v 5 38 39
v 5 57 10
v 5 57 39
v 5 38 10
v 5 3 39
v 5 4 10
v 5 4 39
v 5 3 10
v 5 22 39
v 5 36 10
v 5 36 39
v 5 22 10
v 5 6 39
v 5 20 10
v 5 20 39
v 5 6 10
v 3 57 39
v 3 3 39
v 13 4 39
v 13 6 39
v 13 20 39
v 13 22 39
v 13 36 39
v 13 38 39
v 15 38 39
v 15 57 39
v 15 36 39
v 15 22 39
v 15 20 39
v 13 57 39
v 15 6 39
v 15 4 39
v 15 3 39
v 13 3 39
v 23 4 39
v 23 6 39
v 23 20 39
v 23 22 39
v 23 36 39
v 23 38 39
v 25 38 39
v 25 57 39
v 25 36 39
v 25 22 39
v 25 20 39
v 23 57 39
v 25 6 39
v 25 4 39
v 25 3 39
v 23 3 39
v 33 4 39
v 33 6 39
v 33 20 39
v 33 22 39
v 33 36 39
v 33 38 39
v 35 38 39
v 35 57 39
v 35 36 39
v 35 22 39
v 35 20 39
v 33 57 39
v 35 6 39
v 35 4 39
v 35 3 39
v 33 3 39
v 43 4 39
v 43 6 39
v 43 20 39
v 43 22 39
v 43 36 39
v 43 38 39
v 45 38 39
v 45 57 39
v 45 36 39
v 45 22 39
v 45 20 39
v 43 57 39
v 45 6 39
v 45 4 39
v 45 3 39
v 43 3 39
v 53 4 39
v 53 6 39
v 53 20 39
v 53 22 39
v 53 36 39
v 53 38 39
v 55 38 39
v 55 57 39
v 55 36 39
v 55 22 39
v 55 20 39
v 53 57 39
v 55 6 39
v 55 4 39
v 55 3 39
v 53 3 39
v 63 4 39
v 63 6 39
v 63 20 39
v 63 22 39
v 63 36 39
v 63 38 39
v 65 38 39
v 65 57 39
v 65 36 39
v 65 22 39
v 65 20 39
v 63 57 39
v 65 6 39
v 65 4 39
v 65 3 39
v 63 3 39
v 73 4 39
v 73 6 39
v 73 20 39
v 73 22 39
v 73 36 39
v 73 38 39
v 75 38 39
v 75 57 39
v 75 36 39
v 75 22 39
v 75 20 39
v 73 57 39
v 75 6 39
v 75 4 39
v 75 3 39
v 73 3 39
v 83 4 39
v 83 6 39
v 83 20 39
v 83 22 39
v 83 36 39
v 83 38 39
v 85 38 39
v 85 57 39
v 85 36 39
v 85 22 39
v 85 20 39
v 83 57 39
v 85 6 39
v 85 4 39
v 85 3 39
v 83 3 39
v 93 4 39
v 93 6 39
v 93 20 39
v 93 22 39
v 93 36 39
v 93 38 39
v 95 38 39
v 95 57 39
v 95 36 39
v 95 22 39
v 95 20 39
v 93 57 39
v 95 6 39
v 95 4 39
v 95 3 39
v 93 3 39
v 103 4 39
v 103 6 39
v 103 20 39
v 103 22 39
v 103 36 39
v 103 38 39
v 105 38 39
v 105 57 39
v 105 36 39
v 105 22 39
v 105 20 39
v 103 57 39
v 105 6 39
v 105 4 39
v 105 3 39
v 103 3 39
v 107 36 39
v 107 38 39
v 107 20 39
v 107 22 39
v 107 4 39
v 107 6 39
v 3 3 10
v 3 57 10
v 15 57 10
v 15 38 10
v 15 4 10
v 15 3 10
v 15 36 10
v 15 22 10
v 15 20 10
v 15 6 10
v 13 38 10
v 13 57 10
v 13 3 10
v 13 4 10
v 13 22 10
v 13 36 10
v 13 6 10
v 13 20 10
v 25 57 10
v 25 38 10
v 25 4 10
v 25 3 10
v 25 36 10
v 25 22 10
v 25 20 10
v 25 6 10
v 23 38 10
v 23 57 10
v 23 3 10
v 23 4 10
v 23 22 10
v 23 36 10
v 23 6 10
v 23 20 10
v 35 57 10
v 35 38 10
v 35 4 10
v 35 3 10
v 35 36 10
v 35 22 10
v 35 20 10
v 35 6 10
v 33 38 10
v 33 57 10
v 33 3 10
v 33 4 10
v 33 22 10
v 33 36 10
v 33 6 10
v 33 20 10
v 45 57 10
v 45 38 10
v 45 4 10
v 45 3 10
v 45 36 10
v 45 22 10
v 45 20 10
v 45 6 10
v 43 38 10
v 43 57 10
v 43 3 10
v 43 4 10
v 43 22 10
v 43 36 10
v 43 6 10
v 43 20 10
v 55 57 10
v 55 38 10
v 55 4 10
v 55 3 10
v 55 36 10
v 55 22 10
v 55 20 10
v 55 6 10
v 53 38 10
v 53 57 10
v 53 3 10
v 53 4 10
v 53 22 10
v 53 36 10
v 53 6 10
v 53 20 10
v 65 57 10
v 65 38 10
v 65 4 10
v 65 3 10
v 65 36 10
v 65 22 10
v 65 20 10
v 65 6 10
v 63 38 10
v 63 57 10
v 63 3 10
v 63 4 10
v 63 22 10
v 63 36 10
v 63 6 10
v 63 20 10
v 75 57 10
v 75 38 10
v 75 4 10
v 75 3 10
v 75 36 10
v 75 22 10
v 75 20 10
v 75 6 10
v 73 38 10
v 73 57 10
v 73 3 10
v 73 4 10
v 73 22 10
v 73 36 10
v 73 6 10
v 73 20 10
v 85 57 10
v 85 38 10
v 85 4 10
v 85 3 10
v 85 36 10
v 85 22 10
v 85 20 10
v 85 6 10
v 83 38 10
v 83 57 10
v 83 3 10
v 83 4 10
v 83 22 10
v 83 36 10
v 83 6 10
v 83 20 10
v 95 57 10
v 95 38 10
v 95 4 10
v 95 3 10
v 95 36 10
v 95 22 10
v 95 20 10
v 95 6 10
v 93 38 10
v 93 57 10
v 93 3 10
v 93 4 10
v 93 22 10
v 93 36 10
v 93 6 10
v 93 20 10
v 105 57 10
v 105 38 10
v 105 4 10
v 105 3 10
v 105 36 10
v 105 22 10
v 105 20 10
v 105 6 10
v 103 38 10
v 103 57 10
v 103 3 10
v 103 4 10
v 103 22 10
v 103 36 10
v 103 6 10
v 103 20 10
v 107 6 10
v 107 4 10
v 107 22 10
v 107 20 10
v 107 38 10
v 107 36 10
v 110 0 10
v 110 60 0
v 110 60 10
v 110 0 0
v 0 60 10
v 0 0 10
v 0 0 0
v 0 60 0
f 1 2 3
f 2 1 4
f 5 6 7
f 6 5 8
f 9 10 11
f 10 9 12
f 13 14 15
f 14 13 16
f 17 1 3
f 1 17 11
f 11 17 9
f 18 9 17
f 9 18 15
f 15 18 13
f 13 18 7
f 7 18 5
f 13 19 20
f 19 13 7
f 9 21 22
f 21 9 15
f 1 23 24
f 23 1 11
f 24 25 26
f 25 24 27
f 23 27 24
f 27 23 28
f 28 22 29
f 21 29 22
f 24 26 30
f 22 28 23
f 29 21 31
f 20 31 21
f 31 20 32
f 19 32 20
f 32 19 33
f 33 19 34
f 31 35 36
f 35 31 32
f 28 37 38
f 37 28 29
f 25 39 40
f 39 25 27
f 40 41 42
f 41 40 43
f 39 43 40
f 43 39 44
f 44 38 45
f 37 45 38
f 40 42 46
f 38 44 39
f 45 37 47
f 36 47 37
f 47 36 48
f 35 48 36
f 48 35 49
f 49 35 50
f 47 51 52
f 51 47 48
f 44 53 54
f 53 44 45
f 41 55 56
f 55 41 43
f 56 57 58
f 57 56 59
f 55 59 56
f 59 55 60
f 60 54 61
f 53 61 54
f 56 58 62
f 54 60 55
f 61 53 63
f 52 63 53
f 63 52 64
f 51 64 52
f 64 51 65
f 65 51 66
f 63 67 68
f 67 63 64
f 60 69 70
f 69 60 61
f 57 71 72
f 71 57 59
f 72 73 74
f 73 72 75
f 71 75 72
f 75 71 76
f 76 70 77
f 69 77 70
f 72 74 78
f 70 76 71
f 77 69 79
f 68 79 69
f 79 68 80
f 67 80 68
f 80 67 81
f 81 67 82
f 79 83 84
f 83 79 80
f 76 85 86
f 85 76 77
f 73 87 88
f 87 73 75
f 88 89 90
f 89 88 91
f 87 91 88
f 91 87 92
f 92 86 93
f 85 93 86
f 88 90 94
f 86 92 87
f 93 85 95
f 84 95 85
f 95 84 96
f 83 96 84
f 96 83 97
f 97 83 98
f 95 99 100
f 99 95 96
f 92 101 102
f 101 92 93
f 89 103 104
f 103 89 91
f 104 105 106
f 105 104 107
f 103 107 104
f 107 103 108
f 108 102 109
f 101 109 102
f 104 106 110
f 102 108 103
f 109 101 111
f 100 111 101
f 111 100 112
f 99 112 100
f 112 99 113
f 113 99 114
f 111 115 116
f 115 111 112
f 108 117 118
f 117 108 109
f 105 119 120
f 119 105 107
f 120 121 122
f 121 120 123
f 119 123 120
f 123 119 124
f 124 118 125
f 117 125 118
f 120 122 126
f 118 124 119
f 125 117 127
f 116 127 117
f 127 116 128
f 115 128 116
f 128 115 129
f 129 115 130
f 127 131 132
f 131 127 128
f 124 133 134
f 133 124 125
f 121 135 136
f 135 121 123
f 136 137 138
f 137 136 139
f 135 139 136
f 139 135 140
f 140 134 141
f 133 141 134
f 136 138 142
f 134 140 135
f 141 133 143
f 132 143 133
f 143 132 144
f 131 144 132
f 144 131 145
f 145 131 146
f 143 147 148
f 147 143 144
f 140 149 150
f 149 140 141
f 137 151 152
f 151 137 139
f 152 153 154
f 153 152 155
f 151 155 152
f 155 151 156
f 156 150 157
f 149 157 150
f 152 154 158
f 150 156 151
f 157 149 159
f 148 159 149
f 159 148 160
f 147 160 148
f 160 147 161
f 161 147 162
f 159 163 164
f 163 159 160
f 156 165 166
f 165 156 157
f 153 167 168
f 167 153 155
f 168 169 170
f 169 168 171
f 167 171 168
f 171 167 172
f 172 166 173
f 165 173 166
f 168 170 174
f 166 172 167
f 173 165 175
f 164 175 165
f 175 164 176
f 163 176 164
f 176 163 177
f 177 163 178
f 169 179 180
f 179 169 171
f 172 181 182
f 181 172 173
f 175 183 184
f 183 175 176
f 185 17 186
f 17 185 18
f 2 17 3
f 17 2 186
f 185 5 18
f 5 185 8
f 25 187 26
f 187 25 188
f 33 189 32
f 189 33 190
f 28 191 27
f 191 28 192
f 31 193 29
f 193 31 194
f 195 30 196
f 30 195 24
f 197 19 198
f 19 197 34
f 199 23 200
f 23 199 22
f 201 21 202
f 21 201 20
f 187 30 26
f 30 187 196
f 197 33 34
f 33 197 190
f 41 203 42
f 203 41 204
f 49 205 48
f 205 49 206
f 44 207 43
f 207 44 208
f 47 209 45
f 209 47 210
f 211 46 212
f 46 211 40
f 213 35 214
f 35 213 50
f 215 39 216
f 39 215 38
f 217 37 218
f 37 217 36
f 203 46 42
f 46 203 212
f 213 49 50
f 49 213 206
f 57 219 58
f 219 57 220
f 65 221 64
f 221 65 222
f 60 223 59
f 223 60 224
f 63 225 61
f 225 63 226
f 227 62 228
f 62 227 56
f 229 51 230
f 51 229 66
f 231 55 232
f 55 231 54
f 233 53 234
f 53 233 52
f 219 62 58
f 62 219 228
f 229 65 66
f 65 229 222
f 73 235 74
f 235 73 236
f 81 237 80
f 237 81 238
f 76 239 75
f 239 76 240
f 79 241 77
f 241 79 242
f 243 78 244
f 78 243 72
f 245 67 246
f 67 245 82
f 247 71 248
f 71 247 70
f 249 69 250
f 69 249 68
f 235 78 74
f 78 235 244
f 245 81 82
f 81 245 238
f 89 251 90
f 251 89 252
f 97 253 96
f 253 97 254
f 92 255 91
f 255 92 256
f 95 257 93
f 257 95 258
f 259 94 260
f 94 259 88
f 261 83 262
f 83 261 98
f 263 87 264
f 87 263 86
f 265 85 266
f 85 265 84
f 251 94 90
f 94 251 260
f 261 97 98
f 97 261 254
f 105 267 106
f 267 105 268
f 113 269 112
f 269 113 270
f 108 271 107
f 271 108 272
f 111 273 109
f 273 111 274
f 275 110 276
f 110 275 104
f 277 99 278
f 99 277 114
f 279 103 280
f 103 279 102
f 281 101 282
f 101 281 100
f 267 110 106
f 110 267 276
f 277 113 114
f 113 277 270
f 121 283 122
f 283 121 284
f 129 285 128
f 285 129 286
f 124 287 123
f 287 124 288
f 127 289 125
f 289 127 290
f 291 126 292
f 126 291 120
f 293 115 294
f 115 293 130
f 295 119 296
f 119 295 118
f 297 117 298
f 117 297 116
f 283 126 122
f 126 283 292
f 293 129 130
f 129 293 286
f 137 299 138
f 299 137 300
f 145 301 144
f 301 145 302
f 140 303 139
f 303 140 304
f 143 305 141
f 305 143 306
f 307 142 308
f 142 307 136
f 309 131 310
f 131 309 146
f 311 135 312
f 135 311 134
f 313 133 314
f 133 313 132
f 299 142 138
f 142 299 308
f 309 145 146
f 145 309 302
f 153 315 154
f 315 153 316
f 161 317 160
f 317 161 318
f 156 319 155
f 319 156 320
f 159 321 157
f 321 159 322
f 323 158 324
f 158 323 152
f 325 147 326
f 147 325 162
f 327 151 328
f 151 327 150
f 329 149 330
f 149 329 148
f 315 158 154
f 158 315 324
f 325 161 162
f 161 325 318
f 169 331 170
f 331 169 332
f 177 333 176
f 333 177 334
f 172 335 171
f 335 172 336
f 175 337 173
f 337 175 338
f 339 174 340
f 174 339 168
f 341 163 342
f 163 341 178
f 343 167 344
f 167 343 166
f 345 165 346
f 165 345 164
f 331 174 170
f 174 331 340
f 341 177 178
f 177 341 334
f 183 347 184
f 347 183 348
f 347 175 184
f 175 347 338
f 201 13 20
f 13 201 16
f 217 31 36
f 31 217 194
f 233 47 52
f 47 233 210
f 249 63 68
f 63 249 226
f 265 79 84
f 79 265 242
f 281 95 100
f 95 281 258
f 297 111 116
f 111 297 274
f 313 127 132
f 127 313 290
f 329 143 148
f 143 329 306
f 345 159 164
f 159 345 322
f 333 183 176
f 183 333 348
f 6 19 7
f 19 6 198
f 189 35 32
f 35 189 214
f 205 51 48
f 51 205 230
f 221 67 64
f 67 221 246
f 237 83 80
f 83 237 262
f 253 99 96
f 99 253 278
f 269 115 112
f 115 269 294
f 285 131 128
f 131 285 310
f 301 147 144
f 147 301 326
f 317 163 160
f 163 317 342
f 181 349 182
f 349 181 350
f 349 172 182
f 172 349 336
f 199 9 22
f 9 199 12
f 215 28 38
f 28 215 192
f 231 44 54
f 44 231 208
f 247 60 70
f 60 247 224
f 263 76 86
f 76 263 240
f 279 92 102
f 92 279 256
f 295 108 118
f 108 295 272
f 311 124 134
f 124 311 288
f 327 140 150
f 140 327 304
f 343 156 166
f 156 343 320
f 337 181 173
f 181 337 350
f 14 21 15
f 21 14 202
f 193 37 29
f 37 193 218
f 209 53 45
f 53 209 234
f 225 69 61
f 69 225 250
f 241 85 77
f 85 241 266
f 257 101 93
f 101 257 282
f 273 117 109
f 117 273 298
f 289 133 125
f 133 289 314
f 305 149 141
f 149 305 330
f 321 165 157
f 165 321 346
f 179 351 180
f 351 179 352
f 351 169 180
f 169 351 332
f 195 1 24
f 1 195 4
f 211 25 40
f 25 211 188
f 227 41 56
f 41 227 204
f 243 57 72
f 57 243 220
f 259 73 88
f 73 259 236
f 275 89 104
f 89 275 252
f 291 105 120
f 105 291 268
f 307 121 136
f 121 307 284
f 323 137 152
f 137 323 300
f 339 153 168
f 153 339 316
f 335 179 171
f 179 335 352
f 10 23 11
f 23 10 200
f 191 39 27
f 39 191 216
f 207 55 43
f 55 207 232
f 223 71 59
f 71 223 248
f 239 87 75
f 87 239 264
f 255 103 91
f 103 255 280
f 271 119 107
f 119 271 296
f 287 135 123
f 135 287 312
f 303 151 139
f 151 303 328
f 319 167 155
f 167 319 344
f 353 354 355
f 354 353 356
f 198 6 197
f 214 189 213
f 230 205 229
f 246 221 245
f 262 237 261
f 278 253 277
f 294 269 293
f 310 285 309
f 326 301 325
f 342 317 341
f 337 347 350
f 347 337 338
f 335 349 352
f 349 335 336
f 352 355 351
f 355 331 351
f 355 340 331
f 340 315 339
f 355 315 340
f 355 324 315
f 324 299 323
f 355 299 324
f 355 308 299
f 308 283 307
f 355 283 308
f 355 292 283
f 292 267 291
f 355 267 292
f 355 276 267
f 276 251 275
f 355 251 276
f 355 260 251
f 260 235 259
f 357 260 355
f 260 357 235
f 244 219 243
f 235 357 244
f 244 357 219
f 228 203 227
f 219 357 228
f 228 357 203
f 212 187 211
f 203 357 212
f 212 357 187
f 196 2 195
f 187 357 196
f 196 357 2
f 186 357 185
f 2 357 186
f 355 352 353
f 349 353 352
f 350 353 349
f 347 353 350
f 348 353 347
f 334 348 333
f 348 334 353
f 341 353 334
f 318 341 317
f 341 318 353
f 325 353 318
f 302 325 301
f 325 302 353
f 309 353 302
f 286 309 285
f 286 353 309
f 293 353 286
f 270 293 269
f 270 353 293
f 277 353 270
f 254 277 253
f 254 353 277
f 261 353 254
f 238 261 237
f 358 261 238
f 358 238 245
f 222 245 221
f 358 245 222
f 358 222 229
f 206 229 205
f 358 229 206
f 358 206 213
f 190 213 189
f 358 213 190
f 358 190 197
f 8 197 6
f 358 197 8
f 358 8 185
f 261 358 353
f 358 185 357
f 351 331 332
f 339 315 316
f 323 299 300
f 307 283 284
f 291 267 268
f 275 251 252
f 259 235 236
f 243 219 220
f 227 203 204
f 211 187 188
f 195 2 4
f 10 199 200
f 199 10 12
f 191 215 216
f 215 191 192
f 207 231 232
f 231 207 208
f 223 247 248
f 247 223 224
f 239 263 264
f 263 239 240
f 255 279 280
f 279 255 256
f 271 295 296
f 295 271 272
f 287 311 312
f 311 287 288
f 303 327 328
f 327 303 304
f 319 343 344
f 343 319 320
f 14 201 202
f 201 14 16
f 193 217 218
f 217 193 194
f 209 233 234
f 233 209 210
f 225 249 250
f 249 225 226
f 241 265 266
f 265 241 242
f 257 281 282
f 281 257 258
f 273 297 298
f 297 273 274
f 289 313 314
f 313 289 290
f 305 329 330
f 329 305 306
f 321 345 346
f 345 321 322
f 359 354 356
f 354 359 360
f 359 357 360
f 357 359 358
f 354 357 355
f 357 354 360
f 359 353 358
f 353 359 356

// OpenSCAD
$fn = 32;

// ----------------------------------------------------------------------
// Heatsink: cross fin block
// ----------------------------------------------------------------------

// --- parameters (mm) ---
base_l = 110;             // base length, X
base_w = 60;              // base width, Y
base_t = 10;              // base plate thickness
fin_h = 30;               // fin height above the base
fin_t = 2;                // fin thickness
edge = 3;                 // margin from the base ends
pitch = 10;               // fin pitch
rib_pitch = 16;           // cross rib pitch
fit_tol = 0.1;            // tolerance for press fits, mm
free_tol = 0.3;           // tolerance for clearance fits, mm

n_fins = floor((base_l - 2 * edge - fin_t) / pitch) + 1;  // fin count
total_h = base_t + fin_h - 1;  // overall height
n_ribs = floor((base_w - 2 * edge) / rib_pitch);  // rib count

union() {
  cube([base_l, base_w, base_t]);
  for (i = [0 : n_fins - 1])
    translate([edge + i * pitch, edge, base_t - 1])
      cube([fin_t, base_w - 2 * edge, fin_h]);
  for (i = [0 : n_ribs - 1])
    translate([edge, edge + 1 + i * rib_pitch, base_t - 1])
      cube([base_l - 2 * edge, fin_t, fin_h]);
}
